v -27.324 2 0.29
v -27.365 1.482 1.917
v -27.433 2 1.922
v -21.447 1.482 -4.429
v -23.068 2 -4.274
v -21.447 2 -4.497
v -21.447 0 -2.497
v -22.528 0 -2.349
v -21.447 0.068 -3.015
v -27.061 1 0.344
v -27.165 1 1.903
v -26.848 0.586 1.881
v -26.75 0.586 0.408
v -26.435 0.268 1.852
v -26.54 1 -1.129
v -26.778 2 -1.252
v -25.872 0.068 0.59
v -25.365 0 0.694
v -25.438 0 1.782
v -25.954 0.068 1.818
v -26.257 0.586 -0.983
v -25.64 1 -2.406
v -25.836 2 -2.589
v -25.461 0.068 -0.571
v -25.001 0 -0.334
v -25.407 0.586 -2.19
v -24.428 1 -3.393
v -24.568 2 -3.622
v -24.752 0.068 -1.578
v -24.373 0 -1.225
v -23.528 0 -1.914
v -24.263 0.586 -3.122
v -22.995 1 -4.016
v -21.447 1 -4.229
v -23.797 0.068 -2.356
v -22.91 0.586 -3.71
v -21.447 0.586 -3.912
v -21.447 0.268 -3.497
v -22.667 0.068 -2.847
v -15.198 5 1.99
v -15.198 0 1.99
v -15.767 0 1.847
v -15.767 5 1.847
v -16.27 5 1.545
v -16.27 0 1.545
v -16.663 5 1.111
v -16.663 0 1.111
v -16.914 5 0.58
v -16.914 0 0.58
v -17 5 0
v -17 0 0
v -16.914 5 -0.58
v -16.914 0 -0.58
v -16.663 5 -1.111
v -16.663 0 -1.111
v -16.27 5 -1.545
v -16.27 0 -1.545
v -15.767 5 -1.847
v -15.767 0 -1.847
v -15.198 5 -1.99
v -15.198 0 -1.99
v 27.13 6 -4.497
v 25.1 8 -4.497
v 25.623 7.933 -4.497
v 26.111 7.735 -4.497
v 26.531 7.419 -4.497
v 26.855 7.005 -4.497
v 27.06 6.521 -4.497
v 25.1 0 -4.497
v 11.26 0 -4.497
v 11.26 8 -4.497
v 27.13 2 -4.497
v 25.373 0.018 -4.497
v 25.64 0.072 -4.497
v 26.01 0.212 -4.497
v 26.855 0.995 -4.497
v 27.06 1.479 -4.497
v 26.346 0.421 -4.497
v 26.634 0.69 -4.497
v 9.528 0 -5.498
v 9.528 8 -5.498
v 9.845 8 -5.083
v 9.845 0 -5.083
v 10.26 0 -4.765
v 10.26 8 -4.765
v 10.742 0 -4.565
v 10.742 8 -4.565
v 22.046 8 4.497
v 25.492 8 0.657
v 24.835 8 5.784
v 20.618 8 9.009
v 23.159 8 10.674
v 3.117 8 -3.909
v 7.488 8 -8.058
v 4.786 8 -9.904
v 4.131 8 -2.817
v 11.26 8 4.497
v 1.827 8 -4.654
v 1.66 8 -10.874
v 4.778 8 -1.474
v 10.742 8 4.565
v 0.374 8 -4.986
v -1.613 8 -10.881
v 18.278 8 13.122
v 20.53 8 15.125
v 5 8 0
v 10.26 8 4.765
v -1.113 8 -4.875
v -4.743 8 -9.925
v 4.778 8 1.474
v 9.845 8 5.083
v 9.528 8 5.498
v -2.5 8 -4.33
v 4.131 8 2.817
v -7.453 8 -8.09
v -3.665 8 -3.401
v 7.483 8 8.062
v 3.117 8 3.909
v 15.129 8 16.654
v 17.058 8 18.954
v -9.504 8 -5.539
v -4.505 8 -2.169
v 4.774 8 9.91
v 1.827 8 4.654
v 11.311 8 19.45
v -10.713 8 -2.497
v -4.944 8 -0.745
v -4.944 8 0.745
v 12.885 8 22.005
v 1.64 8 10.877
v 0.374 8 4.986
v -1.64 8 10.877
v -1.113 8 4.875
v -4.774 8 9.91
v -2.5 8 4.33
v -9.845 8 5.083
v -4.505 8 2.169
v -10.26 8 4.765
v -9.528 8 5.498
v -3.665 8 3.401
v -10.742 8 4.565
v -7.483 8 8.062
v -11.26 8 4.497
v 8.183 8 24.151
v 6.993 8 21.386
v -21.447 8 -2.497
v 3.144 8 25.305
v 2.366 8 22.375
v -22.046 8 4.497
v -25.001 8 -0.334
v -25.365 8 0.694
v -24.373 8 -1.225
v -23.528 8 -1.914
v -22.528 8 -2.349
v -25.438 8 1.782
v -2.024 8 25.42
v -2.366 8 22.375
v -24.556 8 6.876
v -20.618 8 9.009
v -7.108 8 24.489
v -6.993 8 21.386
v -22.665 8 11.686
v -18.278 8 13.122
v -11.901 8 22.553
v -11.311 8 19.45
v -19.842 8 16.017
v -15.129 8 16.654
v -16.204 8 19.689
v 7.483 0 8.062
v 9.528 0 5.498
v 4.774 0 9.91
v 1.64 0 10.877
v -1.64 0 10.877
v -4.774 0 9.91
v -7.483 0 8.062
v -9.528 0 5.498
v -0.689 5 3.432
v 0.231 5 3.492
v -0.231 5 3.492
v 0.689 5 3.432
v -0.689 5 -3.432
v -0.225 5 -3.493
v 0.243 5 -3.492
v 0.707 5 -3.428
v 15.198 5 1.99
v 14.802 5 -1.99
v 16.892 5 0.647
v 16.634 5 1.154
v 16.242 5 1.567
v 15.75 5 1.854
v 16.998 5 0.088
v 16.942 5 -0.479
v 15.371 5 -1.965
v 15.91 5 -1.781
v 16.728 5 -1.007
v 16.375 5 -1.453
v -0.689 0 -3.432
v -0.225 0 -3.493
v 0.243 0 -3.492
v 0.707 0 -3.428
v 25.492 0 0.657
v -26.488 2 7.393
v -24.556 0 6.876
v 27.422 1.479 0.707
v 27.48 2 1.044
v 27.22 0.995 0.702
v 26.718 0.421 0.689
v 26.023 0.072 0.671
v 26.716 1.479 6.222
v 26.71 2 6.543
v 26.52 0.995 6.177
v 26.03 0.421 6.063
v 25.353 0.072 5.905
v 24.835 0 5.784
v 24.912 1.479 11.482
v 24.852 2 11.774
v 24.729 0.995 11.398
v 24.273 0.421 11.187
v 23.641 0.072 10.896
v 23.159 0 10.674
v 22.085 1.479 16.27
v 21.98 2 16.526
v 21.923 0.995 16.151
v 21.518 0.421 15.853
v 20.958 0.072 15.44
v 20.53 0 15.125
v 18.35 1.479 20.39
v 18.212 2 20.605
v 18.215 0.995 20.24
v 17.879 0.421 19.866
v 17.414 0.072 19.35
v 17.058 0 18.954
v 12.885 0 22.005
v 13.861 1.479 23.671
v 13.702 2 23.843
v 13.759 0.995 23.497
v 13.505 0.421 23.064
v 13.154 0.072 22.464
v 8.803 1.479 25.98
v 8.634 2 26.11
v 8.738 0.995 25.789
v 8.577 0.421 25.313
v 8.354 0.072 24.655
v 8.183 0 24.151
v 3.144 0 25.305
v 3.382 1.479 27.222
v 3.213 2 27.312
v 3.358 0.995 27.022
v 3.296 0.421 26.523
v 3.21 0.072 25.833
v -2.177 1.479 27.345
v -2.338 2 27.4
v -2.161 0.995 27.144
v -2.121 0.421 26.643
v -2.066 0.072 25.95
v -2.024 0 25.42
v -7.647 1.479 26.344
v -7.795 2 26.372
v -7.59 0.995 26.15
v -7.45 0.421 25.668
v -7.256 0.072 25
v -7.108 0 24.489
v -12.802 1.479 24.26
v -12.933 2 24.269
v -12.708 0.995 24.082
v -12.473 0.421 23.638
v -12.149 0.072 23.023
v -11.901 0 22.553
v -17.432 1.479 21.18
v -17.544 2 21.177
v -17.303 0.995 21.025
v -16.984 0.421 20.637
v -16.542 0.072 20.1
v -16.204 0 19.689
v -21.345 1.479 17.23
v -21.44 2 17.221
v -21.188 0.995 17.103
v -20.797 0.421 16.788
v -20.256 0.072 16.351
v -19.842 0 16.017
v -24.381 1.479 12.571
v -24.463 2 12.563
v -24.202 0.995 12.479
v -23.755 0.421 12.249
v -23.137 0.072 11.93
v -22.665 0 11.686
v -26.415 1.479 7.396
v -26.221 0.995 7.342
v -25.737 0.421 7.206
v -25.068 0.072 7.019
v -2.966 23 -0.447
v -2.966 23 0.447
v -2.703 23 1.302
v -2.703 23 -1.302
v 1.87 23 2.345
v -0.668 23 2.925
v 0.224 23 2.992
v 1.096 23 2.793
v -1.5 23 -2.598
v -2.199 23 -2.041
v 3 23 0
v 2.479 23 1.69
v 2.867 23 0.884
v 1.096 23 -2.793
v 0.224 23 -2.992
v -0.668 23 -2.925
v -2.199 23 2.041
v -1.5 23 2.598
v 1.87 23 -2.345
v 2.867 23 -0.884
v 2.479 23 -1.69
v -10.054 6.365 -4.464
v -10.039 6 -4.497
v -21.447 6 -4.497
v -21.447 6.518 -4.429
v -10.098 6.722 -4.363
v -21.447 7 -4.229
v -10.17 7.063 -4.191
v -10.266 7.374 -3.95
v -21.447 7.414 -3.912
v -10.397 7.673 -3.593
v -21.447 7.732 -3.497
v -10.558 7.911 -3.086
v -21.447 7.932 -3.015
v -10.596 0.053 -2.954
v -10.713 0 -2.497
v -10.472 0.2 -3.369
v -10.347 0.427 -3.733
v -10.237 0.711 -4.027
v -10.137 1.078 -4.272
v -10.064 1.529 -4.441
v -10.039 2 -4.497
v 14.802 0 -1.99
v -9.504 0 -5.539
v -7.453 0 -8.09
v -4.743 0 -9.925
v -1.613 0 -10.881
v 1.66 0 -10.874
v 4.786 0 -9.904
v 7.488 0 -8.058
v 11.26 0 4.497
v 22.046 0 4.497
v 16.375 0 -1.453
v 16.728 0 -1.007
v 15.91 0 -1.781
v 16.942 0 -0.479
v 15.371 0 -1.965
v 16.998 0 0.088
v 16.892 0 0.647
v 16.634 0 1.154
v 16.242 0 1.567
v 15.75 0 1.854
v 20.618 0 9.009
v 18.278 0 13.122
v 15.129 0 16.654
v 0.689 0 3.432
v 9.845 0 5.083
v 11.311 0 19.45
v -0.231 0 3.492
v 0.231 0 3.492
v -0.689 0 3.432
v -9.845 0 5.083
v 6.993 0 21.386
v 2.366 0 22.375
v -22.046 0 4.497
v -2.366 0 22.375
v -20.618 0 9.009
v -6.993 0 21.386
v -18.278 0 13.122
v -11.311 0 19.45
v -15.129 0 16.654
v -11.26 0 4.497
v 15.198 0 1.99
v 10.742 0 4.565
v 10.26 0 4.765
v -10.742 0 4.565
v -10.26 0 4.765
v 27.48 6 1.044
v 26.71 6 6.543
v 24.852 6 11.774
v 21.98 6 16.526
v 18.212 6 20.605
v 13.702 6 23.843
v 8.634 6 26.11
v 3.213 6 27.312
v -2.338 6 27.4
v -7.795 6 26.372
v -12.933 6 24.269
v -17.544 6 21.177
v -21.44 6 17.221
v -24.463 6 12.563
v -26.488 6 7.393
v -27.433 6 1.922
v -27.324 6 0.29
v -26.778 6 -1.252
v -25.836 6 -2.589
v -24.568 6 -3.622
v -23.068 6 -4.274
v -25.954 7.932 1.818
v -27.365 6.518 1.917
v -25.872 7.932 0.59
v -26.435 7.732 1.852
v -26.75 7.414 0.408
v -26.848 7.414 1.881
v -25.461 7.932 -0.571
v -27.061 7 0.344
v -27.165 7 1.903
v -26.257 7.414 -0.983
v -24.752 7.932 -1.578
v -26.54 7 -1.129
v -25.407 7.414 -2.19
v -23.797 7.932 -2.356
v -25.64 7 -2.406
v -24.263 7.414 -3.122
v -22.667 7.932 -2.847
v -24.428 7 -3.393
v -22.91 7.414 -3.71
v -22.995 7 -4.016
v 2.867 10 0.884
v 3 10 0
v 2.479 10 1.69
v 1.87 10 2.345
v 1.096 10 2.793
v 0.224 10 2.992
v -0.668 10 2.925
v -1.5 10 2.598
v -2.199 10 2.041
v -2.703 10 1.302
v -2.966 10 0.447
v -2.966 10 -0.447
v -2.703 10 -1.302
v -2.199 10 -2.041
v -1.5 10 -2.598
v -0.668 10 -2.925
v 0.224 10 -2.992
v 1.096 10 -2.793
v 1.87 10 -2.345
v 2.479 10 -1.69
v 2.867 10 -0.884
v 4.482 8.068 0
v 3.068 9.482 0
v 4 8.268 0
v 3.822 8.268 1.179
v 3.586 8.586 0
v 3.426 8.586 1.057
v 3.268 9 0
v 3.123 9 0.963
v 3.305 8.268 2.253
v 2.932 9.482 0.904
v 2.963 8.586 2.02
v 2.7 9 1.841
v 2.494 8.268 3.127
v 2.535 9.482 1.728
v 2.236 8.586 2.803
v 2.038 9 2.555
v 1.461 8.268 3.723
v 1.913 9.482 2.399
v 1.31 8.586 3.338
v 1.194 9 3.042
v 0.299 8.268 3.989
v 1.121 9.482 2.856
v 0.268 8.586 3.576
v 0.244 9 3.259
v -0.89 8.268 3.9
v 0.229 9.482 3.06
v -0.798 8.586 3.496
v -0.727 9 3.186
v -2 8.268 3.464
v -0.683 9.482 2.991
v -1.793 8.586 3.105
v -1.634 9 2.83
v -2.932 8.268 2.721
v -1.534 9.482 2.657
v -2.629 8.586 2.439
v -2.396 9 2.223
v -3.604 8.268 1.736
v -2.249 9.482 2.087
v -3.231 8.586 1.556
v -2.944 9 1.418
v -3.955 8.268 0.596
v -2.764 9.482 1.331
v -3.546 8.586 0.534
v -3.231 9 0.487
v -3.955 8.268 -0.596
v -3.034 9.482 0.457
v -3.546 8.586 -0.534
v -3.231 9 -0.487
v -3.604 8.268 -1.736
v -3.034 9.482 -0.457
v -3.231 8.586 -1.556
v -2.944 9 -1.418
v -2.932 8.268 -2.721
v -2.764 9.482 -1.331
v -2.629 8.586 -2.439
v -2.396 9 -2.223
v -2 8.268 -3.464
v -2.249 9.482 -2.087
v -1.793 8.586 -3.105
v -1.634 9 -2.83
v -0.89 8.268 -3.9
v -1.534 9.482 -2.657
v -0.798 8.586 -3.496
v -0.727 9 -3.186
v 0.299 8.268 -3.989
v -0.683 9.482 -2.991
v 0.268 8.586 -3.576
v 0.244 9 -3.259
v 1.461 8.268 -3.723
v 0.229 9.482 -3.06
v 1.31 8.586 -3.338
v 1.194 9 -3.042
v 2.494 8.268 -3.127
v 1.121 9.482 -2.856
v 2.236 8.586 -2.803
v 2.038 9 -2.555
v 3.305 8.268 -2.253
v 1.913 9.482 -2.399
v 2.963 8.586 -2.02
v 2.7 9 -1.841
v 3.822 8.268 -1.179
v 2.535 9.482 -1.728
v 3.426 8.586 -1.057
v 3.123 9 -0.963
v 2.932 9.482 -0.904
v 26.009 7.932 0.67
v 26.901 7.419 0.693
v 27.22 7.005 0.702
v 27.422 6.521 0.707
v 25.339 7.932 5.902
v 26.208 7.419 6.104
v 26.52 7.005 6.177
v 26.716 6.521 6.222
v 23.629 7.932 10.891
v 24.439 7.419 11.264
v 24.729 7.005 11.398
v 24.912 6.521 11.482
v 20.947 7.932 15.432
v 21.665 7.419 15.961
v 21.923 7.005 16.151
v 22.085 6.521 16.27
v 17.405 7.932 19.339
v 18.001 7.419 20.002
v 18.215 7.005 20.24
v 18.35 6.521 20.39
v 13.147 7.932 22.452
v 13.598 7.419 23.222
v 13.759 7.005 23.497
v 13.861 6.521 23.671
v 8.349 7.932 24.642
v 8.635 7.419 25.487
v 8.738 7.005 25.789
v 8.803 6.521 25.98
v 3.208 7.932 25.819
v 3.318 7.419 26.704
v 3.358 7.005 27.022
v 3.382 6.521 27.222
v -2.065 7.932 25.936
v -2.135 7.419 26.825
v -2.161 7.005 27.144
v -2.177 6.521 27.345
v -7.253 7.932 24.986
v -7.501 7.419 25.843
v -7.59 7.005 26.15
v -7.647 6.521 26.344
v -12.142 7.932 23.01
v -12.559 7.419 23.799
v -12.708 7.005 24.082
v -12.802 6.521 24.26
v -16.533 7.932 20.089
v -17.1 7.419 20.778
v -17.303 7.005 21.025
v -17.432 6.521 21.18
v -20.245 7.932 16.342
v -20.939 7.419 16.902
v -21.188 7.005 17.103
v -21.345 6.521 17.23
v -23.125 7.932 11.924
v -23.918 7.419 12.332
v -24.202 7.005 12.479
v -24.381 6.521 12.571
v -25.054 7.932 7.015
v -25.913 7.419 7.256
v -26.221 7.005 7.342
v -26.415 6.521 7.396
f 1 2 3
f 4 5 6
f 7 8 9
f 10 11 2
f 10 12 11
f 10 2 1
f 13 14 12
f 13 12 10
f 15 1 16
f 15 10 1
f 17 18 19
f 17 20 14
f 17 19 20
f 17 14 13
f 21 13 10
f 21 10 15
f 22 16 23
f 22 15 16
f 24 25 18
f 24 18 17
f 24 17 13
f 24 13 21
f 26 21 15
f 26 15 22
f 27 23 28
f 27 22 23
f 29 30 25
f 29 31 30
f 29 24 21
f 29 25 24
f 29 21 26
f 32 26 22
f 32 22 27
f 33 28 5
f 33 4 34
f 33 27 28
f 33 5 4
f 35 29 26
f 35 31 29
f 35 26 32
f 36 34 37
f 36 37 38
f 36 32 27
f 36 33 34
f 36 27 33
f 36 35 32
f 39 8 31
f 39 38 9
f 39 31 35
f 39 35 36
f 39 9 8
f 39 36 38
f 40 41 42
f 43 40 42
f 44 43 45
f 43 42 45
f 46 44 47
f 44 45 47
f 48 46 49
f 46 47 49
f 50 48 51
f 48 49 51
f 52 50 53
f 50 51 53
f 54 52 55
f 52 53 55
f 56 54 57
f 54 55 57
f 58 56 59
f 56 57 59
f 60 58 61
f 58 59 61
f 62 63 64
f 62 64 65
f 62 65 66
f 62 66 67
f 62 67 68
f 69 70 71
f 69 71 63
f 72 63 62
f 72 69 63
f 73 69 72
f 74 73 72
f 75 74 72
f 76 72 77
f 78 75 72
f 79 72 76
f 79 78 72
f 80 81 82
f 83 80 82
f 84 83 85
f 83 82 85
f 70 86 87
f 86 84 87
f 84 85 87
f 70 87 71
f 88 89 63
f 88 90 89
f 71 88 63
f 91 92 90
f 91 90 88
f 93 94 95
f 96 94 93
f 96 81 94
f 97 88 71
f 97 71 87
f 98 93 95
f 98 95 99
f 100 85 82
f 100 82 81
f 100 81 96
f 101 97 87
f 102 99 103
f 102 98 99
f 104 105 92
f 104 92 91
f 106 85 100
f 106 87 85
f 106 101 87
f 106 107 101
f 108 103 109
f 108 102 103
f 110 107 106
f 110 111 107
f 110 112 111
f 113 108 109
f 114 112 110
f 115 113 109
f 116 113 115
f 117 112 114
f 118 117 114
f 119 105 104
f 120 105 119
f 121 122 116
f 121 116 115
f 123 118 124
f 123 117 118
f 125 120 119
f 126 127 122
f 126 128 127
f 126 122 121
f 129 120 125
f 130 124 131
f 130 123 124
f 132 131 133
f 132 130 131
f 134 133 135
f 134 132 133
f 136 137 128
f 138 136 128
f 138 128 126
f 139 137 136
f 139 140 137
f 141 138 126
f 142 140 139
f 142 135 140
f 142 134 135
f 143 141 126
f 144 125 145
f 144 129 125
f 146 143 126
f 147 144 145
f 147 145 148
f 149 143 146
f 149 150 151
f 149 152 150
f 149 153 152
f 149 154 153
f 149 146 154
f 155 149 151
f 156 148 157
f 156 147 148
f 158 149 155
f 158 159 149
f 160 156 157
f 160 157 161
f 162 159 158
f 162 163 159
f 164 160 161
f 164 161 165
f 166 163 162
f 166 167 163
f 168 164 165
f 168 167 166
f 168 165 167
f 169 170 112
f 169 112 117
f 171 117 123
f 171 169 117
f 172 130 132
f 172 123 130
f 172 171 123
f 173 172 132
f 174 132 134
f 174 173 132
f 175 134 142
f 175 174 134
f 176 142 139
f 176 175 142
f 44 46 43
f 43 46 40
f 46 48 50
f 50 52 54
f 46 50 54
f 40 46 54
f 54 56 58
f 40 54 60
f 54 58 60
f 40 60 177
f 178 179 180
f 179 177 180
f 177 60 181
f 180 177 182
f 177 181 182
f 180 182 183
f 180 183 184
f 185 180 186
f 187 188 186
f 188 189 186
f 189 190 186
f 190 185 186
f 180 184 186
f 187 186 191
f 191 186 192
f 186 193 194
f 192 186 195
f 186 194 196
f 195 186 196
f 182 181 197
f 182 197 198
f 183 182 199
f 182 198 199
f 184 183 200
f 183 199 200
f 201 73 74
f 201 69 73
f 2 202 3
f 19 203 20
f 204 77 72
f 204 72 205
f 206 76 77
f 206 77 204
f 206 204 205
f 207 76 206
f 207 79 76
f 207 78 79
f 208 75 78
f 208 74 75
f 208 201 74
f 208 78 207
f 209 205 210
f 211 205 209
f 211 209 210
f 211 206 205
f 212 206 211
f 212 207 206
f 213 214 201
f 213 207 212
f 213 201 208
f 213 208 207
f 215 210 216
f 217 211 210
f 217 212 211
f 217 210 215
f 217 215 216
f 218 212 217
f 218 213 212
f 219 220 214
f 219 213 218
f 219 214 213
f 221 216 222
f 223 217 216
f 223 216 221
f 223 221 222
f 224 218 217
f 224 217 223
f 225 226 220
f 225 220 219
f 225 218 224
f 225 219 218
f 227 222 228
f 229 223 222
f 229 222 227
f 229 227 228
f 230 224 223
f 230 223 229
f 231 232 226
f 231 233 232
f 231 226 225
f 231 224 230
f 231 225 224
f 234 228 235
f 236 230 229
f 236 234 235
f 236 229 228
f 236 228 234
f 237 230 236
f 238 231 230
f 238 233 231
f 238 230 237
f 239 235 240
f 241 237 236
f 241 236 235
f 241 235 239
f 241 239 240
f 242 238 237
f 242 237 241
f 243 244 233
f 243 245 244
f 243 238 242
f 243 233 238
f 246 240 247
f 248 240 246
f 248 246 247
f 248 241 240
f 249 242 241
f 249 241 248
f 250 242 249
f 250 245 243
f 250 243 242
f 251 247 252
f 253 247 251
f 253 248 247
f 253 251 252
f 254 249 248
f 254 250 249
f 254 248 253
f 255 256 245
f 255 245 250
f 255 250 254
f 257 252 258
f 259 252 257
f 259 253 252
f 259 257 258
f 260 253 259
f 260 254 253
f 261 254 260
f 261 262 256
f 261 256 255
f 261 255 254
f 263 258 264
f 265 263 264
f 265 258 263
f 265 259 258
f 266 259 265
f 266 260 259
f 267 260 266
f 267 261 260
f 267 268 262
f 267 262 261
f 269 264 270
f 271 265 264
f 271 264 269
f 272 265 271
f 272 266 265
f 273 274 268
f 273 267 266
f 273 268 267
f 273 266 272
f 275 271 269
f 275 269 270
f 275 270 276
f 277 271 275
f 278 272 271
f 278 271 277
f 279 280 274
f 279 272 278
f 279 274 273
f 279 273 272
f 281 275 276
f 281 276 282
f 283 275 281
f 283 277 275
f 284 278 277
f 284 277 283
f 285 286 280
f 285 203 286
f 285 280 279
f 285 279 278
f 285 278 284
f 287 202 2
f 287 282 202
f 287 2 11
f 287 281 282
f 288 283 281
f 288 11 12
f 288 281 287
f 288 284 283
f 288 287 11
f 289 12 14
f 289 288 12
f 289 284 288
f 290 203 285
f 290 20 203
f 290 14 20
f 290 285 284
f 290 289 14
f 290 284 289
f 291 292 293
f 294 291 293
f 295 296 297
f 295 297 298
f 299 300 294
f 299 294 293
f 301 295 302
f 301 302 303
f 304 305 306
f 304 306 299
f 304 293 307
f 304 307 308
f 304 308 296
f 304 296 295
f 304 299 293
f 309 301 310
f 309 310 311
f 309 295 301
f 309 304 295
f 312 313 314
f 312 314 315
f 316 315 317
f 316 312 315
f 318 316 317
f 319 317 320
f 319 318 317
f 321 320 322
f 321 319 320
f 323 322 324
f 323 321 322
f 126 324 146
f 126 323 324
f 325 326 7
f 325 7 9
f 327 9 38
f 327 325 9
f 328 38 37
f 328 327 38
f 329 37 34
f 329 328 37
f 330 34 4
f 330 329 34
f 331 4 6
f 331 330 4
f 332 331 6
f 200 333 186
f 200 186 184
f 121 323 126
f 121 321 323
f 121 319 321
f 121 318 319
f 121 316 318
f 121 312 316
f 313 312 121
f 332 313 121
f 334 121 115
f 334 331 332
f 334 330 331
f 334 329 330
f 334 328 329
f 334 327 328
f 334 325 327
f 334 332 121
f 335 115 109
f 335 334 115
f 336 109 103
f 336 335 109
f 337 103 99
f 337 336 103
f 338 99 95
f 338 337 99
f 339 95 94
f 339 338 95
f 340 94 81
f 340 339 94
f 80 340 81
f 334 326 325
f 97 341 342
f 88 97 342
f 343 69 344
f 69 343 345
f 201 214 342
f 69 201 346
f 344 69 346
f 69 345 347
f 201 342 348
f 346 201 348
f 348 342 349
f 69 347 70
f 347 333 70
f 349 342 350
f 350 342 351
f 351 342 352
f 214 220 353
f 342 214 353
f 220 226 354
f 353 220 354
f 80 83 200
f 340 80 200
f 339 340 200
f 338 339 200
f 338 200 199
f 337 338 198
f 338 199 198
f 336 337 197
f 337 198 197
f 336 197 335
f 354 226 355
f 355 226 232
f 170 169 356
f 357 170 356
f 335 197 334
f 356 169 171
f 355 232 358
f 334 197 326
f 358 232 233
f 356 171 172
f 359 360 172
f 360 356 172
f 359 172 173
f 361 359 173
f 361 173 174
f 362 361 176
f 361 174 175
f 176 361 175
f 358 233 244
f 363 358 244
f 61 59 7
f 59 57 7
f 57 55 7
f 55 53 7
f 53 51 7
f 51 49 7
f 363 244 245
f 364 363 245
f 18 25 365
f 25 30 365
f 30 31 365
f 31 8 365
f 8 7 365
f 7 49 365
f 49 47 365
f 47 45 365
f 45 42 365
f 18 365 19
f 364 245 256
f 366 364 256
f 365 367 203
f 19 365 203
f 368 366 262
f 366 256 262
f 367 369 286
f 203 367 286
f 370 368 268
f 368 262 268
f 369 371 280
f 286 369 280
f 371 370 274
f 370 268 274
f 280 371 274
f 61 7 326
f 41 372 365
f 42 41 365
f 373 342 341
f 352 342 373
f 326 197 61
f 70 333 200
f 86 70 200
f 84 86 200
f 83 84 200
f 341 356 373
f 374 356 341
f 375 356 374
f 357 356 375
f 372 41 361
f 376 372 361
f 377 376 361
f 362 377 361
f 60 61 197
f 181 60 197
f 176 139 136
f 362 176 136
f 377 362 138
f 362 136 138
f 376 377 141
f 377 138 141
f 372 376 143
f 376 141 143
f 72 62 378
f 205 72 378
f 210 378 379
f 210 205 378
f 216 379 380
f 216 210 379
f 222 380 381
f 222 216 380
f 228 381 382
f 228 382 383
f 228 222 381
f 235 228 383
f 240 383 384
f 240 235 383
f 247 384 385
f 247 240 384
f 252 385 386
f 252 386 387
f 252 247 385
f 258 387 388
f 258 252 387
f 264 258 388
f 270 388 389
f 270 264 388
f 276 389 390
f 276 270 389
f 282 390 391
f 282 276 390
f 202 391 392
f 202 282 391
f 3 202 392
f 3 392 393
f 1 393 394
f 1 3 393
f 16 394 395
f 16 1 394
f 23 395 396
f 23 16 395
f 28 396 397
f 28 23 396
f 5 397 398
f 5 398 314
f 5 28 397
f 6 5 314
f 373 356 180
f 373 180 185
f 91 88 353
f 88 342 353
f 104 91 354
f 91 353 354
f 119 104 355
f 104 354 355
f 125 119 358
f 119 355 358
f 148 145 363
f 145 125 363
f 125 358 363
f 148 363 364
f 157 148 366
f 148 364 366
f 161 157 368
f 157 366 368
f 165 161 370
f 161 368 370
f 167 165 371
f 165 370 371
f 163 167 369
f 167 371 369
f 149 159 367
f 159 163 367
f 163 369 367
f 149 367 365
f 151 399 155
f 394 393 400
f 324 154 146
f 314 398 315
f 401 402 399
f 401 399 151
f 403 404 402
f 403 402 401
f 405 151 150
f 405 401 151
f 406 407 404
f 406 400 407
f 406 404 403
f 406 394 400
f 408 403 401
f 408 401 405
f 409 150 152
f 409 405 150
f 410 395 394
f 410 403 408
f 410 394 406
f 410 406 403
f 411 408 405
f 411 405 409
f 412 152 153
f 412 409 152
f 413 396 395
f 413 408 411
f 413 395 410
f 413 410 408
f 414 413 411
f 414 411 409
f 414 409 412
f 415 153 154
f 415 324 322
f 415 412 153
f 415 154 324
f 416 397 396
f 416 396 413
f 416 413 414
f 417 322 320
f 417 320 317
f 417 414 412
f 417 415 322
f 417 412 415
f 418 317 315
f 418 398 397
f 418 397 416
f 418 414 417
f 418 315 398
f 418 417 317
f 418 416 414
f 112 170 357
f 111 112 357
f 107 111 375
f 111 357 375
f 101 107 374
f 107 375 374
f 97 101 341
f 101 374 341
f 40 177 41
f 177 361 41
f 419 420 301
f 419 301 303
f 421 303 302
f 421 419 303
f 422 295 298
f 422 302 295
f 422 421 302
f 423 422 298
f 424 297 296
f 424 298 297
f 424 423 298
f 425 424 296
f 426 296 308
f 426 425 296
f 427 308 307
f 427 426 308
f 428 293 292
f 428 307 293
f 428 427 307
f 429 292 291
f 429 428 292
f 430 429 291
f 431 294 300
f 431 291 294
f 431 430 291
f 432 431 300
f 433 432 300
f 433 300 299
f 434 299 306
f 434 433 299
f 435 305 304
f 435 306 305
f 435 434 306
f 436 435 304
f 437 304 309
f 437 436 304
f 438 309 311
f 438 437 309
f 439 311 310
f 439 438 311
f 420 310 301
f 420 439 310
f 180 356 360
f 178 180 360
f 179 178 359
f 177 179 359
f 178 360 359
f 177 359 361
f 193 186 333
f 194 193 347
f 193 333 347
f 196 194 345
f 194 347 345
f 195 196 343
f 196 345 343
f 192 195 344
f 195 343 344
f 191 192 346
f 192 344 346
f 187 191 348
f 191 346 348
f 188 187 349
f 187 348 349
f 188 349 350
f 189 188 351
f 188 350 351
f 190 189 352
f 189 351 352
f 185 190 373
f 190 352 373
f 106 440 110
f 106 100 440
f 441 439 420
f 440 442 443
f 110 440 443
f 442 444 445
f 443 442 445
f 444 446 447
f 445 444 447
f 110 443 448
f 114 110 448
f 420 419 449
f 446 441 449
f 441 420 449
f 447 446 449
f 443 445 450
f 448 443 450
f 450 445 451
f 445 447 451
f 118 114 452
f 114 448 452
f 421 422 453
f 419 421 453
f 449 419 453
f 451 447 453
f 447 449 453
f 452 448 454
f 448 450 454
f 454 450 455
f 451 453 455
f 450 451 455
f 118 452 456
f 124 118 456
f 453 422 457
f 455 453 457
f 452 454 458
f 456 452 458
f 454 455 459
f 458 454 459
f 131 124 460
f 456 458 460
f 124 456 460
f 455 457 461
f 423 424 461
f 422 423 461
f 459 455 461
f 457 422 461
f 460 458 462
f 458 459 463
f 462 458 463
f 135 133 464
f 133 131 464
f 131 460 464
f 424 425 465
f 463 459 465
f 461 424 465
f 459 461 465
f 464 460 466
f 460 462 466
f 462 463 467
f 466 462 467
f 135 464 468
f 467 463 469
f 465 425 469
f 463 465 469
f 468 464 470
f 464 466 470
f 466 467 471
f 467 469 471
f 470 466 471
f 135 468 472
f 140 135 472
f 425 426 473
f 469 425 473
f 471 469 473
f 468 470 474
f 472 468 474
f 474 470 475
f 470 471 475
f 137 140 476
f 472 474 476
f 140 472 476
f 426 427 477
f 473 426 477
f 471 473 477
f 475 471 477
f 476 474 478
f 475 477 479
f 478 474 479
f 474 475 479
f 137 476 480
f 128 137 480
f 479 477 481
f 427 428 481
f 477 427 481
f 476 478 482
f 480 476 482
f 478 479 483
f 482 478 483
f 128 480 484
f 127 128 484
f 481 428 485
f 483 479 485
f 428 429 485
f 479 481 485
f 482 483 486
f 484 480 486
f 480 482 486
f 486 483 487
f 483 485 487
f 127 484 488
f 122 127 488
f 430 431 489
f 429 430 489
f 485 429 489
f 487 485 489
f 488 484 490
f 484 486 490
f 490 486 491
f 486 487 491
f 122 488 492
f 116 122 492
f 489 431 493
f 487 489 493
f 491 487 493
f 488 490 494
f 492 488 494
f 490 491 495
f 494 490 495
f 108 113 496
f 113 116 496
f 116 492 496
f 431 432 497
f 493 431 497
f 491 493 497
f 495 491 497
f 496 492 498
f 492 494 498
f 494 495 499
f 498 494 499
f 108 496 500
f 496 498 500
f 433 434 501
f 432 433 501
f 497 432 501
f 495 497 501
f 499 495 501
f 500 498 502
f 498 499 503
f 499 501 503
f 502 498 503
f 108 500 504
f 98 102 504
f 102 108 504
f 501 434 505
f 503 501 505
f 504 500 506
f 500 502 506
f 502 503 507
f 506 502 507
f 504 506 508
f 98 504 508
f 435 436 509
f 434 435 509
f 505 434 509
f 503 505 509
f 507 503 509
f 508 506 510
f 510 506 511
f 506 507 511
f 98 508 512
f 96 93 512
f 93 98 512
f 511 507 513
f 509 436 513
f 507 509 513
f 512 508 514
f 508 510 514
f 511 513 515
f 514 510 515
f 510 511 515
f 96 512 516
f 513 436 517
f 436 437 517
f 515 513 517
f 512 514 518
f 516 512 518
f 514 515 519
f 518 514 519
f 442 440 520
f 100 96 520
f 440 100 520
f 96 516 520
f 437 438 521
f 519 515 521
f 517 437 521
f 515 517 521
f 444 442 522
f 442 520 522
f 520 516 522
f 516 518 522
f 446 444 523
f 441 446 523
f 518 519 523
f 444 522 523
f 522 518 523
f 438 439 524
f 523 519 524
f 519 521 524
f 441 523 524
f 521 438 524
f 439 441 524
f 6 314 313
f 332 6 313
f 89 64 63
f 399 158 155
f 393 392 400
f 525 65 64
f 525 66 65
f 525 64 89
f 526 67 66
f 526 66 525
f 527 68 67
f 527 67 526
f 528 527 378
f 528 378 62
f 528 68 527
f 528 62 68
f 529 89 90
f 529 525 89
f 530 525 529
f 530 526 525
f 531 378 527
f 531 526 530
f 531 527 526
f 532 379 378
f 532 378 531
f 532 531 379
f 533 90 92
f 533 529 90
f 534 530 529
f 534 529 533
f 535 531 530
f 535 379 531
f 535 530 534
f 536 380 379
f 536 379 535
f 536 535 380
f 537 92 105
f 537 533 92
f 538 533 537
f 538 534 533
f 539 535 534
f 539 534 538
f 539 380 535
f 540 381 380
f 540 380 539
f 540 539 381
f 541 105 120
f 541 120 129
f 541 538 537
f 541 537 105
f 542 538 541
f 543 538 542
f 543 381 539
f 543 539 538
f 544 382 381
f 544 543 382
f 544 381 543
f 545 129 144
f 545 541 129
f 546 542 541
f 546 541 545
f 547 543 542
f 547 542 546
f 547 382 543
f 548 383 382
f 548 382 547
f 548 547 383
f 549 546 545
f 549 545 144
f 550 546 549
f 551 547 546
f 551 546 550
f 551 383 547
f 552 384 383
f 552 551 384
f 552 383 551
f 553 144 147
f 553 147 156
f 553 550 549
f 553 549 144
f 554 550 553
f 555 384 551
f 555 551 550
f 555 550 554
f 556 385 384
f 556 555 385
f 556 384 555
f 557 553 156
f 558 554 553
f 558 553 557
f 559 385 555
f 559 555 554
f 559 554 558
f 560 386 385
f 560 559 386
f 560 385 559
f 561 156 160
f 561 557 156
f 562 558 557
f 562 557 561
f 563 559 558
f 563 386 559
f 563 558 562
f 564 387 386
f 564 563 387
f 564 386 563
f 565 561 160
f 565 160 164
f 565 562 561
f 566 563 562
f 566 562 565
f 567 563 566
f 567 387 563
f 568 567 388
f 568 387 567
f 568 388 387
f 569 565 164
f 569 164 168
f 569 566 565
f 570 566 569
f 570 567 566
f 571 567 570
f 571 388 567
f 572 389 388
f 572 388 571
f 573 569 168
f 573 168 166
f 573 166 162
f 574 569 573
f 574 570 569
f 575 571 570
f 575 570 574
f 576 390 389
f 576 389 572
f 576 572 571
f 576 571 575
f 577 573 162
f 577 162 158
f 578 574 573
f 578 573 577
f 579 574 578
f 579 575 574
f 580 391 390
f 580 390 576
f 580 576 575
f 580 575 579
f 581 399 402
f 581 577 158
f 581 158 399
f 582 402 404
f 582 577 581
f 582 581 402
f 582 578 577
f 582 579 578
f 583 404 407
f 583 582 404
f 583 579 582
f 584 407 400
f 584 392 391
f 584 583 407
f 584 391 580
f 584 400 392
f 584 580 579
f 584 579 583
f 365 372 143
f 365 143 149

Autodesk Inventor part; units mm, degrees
ref_plane "XZ Plane" through (0, 0, 0) normal (0, 1, 0) x (-1, 0, 0)
ref_plane "XY Plane" through (0, 0, 0) normal (0, 0, 1) x (1, 0, 0)
sketch "Skizze1" plane through (0, 0, 0) normal (0, 1, 0) x (-1, 0, 0)
  circle A0 centre (0, 0) radius 27.5
  circle A1 centre (0, 0) radius 22.5
  circle A2 centre (0, 0) radius 3.5
  line L0 (45.7225, 0) -> (-63.662, 0) construction
  line L1 (0, 78.2374) -> (0, -78.2374) construction
  circle A3 centre (15, 0) radius 2
  circle A4 centre (-15, 0) radius 2
  line L2 (0, 3.5) -> (15.1977, 1.9902)
  line L3 (15.1977, -1.9902) -> (0, -3.5)
  line L4 (-14.8023, -1.9902) -> (0, -3.5)
  line L5 (0, 3.5) -> (-15.1977, 1.9902)
  circle A5 centre (0, 0) radius 11
  line L6 (10.0387, 4.4973) -> (22.046, 4.4973)
  line L7 (-10.0387, 4.4973) -> (-22.046, 4.4973)
  line L8 (10.0387, -4.4973) -> (22.046, -4.4973)
  line L9 (-10.0387, -4.4973) -> (-22.046, -4.4973)
  point P0 (27.1298, 4.4973)
  point P1 (-27.023, -5.1)
  point P2 (13.75, -23.8157)
  point P3 (-13.75, 23.8157)
  point P4 (-0.6886, 3.4316)
  point P5 (0.6886, 3.4316)
  point P6 (0.6886, -3.4316)
  point P7 (-0.7066, -3.4279)
  dimension "d0" = 55
  dimension "d1" = 45
  dimension "d2" = 7
  dimension "d3" = 4
  dimension "d4" = 4
  dimension "d5" = 15
  dimension "d6" = 22
ref_plane "Arbeitsebene1" through (0, 3.7, 0) normal (0, 1, 0) x (1, 0, 0)
extrude "Extrusion3" add sketch "Skizze1" along normal blind 8 contours A0 | A1 L8 A5 L3 A3 L2 L6 | L7 A5 L5 A4 L4 L9 A1 | A5 L2 A2 L5 | A5 L4 A2 L3
sketch "Skizze3" plane through (0, 8, 0) normal (0, 1, 0) x (1, 0, 0)
  arc A0 (22.046, 4.4973) -> (-22.046, 4.4973) centre (0, 0) ccw projected
  arc A1 (-22.046, -4.4973) -> (22.046, -4.4973) centre (0, 0) ccw projected
  line L0 (-22.046, 4.4973) -> (22.046, 4.4973)
  line L1 (22.046, 4.4973) -> (22.046, -4.4973)
  line L2 (22.046, -4.4973) -> (-22.046, -4.4973)
  line L3 (-22.046, -4.4973) -> (-22.046, 4.4973)
extrude "Extrusion4" add sketch "Skizze3" against normal blind 3 contours L1 L2 L3 L0
sketch "Skizze7" plane through (0, 8, 0) normal (0, 1, 0) x (1, 0, 0)
  arc A0 (22.046, 4.4973) -> (-22.046, 4.4973) centre (0, 0) ccw projected
  line L0 (-22.046, 4.4973) -> (-27.1298, 4.4973)
  circle A1 centre (0, 0) radius 27.5 projected
  line L1 (22.046, 4.4973) -> (10.0387, 4.4973) projected
  line L2 (22.046, 4.4973) -> (27.1412, 4.4973)
  line L3 (27.1412, 4.4973) -> (9.9712, 4.4973)
  arc A2 (10.0387, 4.4973) -> (-10.0387, 4.4973) centre (0, 0) ccw projected
  line L4 (-22.046, 4.4973) -> (-10.0387, 4.4973)
  circle A3 centre (0, 0) radius 11
  circle A4 centre (0, 0) radius 27.5
  point P0 (27.1298, 4.4973)
extrude "Extrusion8" cut sketch "Skizze7" against normal blind 10 contours L1 A2 L4 A0 | A0 L0 A1 L2
fillet "Rundung8" radius 6 1 edges at (-27.1298, 4, -4.4973)
fillet "Rundung9" radius 2 6 edges at (-25.8358, 0, -2.589) (-15.743, 0, -4.4973) (3.2133, 0, 27.3116) (-25.8358, 8, -2.589) (-15.743, 8, -4.4973) (3.2133, 8, 27.3116)
sketch "Skizze9" plane through (0, 8, 0) normal (0, 1, 0) x (1, 0, 0)
  circle A0 centre (0, 0) radius 3
  dimension "d47" = 6
extrude "Extrusion9" add sketch "Skizze9" along normal blind 15
fillet "Rundung10" radius 2 3 edges at (10.0387, 4, 4.4973) (10.0387, 4, -4.4973) (-10.0387, 4, 4.4973)
fillet "Rundung11" radius 2 1 edges at (-3, 8, 0)
ref_plane "Arbeitsebene4" through (0, 0, 0) normal (1, 0, 0) x (0, 1, 0)
sketch "Skizze10" plane through (27.1298, 2, -4.4973) normal (0, 0, -1) x (-1, 0, 0)
  line L0 (0, 0) -> (0, 4) projected
  line L1 (0, 2) -> (17.4598, 2)
  circle A0 centre (6, 2) radius 3
  point P0 (27.1298, -2)
  dimension "d53" = 6
  dimension "d54" = 6
sketch "Skizze11" plane through (0, 0, 0) normal (1, 0, 0) x (0, 1, 0)
  line L0 (4, -48.7659) -> (4, 34.6929) construction
  line L1 (8, -11) -> (8, -2.4973) construction
  circle A0 centre (4, -19) radius 2
  point P0 (0, 0)
  point P1 (8, -5.4977)
  dimension "d55" = 4
  dimension "d56" = 4
  dimension "d57" = 8
sketch "Skizze12" plane through (0, 3.7, 0) normal (0, 1, 0) x (1, 0, 0)
  arc A0 (-25.4376, -1.7823) -> (25.1003, 4.4973) centre (0, 0) ccw projected
  spline S0 degree 2 poles (25.1003, 4.4973) (21.7392, 19.3697) (0, 19.7453) knots 0 0 0 1 1 1
  point P0 (18.4599, 14.8701)
properties part number "_3D-Druck"
